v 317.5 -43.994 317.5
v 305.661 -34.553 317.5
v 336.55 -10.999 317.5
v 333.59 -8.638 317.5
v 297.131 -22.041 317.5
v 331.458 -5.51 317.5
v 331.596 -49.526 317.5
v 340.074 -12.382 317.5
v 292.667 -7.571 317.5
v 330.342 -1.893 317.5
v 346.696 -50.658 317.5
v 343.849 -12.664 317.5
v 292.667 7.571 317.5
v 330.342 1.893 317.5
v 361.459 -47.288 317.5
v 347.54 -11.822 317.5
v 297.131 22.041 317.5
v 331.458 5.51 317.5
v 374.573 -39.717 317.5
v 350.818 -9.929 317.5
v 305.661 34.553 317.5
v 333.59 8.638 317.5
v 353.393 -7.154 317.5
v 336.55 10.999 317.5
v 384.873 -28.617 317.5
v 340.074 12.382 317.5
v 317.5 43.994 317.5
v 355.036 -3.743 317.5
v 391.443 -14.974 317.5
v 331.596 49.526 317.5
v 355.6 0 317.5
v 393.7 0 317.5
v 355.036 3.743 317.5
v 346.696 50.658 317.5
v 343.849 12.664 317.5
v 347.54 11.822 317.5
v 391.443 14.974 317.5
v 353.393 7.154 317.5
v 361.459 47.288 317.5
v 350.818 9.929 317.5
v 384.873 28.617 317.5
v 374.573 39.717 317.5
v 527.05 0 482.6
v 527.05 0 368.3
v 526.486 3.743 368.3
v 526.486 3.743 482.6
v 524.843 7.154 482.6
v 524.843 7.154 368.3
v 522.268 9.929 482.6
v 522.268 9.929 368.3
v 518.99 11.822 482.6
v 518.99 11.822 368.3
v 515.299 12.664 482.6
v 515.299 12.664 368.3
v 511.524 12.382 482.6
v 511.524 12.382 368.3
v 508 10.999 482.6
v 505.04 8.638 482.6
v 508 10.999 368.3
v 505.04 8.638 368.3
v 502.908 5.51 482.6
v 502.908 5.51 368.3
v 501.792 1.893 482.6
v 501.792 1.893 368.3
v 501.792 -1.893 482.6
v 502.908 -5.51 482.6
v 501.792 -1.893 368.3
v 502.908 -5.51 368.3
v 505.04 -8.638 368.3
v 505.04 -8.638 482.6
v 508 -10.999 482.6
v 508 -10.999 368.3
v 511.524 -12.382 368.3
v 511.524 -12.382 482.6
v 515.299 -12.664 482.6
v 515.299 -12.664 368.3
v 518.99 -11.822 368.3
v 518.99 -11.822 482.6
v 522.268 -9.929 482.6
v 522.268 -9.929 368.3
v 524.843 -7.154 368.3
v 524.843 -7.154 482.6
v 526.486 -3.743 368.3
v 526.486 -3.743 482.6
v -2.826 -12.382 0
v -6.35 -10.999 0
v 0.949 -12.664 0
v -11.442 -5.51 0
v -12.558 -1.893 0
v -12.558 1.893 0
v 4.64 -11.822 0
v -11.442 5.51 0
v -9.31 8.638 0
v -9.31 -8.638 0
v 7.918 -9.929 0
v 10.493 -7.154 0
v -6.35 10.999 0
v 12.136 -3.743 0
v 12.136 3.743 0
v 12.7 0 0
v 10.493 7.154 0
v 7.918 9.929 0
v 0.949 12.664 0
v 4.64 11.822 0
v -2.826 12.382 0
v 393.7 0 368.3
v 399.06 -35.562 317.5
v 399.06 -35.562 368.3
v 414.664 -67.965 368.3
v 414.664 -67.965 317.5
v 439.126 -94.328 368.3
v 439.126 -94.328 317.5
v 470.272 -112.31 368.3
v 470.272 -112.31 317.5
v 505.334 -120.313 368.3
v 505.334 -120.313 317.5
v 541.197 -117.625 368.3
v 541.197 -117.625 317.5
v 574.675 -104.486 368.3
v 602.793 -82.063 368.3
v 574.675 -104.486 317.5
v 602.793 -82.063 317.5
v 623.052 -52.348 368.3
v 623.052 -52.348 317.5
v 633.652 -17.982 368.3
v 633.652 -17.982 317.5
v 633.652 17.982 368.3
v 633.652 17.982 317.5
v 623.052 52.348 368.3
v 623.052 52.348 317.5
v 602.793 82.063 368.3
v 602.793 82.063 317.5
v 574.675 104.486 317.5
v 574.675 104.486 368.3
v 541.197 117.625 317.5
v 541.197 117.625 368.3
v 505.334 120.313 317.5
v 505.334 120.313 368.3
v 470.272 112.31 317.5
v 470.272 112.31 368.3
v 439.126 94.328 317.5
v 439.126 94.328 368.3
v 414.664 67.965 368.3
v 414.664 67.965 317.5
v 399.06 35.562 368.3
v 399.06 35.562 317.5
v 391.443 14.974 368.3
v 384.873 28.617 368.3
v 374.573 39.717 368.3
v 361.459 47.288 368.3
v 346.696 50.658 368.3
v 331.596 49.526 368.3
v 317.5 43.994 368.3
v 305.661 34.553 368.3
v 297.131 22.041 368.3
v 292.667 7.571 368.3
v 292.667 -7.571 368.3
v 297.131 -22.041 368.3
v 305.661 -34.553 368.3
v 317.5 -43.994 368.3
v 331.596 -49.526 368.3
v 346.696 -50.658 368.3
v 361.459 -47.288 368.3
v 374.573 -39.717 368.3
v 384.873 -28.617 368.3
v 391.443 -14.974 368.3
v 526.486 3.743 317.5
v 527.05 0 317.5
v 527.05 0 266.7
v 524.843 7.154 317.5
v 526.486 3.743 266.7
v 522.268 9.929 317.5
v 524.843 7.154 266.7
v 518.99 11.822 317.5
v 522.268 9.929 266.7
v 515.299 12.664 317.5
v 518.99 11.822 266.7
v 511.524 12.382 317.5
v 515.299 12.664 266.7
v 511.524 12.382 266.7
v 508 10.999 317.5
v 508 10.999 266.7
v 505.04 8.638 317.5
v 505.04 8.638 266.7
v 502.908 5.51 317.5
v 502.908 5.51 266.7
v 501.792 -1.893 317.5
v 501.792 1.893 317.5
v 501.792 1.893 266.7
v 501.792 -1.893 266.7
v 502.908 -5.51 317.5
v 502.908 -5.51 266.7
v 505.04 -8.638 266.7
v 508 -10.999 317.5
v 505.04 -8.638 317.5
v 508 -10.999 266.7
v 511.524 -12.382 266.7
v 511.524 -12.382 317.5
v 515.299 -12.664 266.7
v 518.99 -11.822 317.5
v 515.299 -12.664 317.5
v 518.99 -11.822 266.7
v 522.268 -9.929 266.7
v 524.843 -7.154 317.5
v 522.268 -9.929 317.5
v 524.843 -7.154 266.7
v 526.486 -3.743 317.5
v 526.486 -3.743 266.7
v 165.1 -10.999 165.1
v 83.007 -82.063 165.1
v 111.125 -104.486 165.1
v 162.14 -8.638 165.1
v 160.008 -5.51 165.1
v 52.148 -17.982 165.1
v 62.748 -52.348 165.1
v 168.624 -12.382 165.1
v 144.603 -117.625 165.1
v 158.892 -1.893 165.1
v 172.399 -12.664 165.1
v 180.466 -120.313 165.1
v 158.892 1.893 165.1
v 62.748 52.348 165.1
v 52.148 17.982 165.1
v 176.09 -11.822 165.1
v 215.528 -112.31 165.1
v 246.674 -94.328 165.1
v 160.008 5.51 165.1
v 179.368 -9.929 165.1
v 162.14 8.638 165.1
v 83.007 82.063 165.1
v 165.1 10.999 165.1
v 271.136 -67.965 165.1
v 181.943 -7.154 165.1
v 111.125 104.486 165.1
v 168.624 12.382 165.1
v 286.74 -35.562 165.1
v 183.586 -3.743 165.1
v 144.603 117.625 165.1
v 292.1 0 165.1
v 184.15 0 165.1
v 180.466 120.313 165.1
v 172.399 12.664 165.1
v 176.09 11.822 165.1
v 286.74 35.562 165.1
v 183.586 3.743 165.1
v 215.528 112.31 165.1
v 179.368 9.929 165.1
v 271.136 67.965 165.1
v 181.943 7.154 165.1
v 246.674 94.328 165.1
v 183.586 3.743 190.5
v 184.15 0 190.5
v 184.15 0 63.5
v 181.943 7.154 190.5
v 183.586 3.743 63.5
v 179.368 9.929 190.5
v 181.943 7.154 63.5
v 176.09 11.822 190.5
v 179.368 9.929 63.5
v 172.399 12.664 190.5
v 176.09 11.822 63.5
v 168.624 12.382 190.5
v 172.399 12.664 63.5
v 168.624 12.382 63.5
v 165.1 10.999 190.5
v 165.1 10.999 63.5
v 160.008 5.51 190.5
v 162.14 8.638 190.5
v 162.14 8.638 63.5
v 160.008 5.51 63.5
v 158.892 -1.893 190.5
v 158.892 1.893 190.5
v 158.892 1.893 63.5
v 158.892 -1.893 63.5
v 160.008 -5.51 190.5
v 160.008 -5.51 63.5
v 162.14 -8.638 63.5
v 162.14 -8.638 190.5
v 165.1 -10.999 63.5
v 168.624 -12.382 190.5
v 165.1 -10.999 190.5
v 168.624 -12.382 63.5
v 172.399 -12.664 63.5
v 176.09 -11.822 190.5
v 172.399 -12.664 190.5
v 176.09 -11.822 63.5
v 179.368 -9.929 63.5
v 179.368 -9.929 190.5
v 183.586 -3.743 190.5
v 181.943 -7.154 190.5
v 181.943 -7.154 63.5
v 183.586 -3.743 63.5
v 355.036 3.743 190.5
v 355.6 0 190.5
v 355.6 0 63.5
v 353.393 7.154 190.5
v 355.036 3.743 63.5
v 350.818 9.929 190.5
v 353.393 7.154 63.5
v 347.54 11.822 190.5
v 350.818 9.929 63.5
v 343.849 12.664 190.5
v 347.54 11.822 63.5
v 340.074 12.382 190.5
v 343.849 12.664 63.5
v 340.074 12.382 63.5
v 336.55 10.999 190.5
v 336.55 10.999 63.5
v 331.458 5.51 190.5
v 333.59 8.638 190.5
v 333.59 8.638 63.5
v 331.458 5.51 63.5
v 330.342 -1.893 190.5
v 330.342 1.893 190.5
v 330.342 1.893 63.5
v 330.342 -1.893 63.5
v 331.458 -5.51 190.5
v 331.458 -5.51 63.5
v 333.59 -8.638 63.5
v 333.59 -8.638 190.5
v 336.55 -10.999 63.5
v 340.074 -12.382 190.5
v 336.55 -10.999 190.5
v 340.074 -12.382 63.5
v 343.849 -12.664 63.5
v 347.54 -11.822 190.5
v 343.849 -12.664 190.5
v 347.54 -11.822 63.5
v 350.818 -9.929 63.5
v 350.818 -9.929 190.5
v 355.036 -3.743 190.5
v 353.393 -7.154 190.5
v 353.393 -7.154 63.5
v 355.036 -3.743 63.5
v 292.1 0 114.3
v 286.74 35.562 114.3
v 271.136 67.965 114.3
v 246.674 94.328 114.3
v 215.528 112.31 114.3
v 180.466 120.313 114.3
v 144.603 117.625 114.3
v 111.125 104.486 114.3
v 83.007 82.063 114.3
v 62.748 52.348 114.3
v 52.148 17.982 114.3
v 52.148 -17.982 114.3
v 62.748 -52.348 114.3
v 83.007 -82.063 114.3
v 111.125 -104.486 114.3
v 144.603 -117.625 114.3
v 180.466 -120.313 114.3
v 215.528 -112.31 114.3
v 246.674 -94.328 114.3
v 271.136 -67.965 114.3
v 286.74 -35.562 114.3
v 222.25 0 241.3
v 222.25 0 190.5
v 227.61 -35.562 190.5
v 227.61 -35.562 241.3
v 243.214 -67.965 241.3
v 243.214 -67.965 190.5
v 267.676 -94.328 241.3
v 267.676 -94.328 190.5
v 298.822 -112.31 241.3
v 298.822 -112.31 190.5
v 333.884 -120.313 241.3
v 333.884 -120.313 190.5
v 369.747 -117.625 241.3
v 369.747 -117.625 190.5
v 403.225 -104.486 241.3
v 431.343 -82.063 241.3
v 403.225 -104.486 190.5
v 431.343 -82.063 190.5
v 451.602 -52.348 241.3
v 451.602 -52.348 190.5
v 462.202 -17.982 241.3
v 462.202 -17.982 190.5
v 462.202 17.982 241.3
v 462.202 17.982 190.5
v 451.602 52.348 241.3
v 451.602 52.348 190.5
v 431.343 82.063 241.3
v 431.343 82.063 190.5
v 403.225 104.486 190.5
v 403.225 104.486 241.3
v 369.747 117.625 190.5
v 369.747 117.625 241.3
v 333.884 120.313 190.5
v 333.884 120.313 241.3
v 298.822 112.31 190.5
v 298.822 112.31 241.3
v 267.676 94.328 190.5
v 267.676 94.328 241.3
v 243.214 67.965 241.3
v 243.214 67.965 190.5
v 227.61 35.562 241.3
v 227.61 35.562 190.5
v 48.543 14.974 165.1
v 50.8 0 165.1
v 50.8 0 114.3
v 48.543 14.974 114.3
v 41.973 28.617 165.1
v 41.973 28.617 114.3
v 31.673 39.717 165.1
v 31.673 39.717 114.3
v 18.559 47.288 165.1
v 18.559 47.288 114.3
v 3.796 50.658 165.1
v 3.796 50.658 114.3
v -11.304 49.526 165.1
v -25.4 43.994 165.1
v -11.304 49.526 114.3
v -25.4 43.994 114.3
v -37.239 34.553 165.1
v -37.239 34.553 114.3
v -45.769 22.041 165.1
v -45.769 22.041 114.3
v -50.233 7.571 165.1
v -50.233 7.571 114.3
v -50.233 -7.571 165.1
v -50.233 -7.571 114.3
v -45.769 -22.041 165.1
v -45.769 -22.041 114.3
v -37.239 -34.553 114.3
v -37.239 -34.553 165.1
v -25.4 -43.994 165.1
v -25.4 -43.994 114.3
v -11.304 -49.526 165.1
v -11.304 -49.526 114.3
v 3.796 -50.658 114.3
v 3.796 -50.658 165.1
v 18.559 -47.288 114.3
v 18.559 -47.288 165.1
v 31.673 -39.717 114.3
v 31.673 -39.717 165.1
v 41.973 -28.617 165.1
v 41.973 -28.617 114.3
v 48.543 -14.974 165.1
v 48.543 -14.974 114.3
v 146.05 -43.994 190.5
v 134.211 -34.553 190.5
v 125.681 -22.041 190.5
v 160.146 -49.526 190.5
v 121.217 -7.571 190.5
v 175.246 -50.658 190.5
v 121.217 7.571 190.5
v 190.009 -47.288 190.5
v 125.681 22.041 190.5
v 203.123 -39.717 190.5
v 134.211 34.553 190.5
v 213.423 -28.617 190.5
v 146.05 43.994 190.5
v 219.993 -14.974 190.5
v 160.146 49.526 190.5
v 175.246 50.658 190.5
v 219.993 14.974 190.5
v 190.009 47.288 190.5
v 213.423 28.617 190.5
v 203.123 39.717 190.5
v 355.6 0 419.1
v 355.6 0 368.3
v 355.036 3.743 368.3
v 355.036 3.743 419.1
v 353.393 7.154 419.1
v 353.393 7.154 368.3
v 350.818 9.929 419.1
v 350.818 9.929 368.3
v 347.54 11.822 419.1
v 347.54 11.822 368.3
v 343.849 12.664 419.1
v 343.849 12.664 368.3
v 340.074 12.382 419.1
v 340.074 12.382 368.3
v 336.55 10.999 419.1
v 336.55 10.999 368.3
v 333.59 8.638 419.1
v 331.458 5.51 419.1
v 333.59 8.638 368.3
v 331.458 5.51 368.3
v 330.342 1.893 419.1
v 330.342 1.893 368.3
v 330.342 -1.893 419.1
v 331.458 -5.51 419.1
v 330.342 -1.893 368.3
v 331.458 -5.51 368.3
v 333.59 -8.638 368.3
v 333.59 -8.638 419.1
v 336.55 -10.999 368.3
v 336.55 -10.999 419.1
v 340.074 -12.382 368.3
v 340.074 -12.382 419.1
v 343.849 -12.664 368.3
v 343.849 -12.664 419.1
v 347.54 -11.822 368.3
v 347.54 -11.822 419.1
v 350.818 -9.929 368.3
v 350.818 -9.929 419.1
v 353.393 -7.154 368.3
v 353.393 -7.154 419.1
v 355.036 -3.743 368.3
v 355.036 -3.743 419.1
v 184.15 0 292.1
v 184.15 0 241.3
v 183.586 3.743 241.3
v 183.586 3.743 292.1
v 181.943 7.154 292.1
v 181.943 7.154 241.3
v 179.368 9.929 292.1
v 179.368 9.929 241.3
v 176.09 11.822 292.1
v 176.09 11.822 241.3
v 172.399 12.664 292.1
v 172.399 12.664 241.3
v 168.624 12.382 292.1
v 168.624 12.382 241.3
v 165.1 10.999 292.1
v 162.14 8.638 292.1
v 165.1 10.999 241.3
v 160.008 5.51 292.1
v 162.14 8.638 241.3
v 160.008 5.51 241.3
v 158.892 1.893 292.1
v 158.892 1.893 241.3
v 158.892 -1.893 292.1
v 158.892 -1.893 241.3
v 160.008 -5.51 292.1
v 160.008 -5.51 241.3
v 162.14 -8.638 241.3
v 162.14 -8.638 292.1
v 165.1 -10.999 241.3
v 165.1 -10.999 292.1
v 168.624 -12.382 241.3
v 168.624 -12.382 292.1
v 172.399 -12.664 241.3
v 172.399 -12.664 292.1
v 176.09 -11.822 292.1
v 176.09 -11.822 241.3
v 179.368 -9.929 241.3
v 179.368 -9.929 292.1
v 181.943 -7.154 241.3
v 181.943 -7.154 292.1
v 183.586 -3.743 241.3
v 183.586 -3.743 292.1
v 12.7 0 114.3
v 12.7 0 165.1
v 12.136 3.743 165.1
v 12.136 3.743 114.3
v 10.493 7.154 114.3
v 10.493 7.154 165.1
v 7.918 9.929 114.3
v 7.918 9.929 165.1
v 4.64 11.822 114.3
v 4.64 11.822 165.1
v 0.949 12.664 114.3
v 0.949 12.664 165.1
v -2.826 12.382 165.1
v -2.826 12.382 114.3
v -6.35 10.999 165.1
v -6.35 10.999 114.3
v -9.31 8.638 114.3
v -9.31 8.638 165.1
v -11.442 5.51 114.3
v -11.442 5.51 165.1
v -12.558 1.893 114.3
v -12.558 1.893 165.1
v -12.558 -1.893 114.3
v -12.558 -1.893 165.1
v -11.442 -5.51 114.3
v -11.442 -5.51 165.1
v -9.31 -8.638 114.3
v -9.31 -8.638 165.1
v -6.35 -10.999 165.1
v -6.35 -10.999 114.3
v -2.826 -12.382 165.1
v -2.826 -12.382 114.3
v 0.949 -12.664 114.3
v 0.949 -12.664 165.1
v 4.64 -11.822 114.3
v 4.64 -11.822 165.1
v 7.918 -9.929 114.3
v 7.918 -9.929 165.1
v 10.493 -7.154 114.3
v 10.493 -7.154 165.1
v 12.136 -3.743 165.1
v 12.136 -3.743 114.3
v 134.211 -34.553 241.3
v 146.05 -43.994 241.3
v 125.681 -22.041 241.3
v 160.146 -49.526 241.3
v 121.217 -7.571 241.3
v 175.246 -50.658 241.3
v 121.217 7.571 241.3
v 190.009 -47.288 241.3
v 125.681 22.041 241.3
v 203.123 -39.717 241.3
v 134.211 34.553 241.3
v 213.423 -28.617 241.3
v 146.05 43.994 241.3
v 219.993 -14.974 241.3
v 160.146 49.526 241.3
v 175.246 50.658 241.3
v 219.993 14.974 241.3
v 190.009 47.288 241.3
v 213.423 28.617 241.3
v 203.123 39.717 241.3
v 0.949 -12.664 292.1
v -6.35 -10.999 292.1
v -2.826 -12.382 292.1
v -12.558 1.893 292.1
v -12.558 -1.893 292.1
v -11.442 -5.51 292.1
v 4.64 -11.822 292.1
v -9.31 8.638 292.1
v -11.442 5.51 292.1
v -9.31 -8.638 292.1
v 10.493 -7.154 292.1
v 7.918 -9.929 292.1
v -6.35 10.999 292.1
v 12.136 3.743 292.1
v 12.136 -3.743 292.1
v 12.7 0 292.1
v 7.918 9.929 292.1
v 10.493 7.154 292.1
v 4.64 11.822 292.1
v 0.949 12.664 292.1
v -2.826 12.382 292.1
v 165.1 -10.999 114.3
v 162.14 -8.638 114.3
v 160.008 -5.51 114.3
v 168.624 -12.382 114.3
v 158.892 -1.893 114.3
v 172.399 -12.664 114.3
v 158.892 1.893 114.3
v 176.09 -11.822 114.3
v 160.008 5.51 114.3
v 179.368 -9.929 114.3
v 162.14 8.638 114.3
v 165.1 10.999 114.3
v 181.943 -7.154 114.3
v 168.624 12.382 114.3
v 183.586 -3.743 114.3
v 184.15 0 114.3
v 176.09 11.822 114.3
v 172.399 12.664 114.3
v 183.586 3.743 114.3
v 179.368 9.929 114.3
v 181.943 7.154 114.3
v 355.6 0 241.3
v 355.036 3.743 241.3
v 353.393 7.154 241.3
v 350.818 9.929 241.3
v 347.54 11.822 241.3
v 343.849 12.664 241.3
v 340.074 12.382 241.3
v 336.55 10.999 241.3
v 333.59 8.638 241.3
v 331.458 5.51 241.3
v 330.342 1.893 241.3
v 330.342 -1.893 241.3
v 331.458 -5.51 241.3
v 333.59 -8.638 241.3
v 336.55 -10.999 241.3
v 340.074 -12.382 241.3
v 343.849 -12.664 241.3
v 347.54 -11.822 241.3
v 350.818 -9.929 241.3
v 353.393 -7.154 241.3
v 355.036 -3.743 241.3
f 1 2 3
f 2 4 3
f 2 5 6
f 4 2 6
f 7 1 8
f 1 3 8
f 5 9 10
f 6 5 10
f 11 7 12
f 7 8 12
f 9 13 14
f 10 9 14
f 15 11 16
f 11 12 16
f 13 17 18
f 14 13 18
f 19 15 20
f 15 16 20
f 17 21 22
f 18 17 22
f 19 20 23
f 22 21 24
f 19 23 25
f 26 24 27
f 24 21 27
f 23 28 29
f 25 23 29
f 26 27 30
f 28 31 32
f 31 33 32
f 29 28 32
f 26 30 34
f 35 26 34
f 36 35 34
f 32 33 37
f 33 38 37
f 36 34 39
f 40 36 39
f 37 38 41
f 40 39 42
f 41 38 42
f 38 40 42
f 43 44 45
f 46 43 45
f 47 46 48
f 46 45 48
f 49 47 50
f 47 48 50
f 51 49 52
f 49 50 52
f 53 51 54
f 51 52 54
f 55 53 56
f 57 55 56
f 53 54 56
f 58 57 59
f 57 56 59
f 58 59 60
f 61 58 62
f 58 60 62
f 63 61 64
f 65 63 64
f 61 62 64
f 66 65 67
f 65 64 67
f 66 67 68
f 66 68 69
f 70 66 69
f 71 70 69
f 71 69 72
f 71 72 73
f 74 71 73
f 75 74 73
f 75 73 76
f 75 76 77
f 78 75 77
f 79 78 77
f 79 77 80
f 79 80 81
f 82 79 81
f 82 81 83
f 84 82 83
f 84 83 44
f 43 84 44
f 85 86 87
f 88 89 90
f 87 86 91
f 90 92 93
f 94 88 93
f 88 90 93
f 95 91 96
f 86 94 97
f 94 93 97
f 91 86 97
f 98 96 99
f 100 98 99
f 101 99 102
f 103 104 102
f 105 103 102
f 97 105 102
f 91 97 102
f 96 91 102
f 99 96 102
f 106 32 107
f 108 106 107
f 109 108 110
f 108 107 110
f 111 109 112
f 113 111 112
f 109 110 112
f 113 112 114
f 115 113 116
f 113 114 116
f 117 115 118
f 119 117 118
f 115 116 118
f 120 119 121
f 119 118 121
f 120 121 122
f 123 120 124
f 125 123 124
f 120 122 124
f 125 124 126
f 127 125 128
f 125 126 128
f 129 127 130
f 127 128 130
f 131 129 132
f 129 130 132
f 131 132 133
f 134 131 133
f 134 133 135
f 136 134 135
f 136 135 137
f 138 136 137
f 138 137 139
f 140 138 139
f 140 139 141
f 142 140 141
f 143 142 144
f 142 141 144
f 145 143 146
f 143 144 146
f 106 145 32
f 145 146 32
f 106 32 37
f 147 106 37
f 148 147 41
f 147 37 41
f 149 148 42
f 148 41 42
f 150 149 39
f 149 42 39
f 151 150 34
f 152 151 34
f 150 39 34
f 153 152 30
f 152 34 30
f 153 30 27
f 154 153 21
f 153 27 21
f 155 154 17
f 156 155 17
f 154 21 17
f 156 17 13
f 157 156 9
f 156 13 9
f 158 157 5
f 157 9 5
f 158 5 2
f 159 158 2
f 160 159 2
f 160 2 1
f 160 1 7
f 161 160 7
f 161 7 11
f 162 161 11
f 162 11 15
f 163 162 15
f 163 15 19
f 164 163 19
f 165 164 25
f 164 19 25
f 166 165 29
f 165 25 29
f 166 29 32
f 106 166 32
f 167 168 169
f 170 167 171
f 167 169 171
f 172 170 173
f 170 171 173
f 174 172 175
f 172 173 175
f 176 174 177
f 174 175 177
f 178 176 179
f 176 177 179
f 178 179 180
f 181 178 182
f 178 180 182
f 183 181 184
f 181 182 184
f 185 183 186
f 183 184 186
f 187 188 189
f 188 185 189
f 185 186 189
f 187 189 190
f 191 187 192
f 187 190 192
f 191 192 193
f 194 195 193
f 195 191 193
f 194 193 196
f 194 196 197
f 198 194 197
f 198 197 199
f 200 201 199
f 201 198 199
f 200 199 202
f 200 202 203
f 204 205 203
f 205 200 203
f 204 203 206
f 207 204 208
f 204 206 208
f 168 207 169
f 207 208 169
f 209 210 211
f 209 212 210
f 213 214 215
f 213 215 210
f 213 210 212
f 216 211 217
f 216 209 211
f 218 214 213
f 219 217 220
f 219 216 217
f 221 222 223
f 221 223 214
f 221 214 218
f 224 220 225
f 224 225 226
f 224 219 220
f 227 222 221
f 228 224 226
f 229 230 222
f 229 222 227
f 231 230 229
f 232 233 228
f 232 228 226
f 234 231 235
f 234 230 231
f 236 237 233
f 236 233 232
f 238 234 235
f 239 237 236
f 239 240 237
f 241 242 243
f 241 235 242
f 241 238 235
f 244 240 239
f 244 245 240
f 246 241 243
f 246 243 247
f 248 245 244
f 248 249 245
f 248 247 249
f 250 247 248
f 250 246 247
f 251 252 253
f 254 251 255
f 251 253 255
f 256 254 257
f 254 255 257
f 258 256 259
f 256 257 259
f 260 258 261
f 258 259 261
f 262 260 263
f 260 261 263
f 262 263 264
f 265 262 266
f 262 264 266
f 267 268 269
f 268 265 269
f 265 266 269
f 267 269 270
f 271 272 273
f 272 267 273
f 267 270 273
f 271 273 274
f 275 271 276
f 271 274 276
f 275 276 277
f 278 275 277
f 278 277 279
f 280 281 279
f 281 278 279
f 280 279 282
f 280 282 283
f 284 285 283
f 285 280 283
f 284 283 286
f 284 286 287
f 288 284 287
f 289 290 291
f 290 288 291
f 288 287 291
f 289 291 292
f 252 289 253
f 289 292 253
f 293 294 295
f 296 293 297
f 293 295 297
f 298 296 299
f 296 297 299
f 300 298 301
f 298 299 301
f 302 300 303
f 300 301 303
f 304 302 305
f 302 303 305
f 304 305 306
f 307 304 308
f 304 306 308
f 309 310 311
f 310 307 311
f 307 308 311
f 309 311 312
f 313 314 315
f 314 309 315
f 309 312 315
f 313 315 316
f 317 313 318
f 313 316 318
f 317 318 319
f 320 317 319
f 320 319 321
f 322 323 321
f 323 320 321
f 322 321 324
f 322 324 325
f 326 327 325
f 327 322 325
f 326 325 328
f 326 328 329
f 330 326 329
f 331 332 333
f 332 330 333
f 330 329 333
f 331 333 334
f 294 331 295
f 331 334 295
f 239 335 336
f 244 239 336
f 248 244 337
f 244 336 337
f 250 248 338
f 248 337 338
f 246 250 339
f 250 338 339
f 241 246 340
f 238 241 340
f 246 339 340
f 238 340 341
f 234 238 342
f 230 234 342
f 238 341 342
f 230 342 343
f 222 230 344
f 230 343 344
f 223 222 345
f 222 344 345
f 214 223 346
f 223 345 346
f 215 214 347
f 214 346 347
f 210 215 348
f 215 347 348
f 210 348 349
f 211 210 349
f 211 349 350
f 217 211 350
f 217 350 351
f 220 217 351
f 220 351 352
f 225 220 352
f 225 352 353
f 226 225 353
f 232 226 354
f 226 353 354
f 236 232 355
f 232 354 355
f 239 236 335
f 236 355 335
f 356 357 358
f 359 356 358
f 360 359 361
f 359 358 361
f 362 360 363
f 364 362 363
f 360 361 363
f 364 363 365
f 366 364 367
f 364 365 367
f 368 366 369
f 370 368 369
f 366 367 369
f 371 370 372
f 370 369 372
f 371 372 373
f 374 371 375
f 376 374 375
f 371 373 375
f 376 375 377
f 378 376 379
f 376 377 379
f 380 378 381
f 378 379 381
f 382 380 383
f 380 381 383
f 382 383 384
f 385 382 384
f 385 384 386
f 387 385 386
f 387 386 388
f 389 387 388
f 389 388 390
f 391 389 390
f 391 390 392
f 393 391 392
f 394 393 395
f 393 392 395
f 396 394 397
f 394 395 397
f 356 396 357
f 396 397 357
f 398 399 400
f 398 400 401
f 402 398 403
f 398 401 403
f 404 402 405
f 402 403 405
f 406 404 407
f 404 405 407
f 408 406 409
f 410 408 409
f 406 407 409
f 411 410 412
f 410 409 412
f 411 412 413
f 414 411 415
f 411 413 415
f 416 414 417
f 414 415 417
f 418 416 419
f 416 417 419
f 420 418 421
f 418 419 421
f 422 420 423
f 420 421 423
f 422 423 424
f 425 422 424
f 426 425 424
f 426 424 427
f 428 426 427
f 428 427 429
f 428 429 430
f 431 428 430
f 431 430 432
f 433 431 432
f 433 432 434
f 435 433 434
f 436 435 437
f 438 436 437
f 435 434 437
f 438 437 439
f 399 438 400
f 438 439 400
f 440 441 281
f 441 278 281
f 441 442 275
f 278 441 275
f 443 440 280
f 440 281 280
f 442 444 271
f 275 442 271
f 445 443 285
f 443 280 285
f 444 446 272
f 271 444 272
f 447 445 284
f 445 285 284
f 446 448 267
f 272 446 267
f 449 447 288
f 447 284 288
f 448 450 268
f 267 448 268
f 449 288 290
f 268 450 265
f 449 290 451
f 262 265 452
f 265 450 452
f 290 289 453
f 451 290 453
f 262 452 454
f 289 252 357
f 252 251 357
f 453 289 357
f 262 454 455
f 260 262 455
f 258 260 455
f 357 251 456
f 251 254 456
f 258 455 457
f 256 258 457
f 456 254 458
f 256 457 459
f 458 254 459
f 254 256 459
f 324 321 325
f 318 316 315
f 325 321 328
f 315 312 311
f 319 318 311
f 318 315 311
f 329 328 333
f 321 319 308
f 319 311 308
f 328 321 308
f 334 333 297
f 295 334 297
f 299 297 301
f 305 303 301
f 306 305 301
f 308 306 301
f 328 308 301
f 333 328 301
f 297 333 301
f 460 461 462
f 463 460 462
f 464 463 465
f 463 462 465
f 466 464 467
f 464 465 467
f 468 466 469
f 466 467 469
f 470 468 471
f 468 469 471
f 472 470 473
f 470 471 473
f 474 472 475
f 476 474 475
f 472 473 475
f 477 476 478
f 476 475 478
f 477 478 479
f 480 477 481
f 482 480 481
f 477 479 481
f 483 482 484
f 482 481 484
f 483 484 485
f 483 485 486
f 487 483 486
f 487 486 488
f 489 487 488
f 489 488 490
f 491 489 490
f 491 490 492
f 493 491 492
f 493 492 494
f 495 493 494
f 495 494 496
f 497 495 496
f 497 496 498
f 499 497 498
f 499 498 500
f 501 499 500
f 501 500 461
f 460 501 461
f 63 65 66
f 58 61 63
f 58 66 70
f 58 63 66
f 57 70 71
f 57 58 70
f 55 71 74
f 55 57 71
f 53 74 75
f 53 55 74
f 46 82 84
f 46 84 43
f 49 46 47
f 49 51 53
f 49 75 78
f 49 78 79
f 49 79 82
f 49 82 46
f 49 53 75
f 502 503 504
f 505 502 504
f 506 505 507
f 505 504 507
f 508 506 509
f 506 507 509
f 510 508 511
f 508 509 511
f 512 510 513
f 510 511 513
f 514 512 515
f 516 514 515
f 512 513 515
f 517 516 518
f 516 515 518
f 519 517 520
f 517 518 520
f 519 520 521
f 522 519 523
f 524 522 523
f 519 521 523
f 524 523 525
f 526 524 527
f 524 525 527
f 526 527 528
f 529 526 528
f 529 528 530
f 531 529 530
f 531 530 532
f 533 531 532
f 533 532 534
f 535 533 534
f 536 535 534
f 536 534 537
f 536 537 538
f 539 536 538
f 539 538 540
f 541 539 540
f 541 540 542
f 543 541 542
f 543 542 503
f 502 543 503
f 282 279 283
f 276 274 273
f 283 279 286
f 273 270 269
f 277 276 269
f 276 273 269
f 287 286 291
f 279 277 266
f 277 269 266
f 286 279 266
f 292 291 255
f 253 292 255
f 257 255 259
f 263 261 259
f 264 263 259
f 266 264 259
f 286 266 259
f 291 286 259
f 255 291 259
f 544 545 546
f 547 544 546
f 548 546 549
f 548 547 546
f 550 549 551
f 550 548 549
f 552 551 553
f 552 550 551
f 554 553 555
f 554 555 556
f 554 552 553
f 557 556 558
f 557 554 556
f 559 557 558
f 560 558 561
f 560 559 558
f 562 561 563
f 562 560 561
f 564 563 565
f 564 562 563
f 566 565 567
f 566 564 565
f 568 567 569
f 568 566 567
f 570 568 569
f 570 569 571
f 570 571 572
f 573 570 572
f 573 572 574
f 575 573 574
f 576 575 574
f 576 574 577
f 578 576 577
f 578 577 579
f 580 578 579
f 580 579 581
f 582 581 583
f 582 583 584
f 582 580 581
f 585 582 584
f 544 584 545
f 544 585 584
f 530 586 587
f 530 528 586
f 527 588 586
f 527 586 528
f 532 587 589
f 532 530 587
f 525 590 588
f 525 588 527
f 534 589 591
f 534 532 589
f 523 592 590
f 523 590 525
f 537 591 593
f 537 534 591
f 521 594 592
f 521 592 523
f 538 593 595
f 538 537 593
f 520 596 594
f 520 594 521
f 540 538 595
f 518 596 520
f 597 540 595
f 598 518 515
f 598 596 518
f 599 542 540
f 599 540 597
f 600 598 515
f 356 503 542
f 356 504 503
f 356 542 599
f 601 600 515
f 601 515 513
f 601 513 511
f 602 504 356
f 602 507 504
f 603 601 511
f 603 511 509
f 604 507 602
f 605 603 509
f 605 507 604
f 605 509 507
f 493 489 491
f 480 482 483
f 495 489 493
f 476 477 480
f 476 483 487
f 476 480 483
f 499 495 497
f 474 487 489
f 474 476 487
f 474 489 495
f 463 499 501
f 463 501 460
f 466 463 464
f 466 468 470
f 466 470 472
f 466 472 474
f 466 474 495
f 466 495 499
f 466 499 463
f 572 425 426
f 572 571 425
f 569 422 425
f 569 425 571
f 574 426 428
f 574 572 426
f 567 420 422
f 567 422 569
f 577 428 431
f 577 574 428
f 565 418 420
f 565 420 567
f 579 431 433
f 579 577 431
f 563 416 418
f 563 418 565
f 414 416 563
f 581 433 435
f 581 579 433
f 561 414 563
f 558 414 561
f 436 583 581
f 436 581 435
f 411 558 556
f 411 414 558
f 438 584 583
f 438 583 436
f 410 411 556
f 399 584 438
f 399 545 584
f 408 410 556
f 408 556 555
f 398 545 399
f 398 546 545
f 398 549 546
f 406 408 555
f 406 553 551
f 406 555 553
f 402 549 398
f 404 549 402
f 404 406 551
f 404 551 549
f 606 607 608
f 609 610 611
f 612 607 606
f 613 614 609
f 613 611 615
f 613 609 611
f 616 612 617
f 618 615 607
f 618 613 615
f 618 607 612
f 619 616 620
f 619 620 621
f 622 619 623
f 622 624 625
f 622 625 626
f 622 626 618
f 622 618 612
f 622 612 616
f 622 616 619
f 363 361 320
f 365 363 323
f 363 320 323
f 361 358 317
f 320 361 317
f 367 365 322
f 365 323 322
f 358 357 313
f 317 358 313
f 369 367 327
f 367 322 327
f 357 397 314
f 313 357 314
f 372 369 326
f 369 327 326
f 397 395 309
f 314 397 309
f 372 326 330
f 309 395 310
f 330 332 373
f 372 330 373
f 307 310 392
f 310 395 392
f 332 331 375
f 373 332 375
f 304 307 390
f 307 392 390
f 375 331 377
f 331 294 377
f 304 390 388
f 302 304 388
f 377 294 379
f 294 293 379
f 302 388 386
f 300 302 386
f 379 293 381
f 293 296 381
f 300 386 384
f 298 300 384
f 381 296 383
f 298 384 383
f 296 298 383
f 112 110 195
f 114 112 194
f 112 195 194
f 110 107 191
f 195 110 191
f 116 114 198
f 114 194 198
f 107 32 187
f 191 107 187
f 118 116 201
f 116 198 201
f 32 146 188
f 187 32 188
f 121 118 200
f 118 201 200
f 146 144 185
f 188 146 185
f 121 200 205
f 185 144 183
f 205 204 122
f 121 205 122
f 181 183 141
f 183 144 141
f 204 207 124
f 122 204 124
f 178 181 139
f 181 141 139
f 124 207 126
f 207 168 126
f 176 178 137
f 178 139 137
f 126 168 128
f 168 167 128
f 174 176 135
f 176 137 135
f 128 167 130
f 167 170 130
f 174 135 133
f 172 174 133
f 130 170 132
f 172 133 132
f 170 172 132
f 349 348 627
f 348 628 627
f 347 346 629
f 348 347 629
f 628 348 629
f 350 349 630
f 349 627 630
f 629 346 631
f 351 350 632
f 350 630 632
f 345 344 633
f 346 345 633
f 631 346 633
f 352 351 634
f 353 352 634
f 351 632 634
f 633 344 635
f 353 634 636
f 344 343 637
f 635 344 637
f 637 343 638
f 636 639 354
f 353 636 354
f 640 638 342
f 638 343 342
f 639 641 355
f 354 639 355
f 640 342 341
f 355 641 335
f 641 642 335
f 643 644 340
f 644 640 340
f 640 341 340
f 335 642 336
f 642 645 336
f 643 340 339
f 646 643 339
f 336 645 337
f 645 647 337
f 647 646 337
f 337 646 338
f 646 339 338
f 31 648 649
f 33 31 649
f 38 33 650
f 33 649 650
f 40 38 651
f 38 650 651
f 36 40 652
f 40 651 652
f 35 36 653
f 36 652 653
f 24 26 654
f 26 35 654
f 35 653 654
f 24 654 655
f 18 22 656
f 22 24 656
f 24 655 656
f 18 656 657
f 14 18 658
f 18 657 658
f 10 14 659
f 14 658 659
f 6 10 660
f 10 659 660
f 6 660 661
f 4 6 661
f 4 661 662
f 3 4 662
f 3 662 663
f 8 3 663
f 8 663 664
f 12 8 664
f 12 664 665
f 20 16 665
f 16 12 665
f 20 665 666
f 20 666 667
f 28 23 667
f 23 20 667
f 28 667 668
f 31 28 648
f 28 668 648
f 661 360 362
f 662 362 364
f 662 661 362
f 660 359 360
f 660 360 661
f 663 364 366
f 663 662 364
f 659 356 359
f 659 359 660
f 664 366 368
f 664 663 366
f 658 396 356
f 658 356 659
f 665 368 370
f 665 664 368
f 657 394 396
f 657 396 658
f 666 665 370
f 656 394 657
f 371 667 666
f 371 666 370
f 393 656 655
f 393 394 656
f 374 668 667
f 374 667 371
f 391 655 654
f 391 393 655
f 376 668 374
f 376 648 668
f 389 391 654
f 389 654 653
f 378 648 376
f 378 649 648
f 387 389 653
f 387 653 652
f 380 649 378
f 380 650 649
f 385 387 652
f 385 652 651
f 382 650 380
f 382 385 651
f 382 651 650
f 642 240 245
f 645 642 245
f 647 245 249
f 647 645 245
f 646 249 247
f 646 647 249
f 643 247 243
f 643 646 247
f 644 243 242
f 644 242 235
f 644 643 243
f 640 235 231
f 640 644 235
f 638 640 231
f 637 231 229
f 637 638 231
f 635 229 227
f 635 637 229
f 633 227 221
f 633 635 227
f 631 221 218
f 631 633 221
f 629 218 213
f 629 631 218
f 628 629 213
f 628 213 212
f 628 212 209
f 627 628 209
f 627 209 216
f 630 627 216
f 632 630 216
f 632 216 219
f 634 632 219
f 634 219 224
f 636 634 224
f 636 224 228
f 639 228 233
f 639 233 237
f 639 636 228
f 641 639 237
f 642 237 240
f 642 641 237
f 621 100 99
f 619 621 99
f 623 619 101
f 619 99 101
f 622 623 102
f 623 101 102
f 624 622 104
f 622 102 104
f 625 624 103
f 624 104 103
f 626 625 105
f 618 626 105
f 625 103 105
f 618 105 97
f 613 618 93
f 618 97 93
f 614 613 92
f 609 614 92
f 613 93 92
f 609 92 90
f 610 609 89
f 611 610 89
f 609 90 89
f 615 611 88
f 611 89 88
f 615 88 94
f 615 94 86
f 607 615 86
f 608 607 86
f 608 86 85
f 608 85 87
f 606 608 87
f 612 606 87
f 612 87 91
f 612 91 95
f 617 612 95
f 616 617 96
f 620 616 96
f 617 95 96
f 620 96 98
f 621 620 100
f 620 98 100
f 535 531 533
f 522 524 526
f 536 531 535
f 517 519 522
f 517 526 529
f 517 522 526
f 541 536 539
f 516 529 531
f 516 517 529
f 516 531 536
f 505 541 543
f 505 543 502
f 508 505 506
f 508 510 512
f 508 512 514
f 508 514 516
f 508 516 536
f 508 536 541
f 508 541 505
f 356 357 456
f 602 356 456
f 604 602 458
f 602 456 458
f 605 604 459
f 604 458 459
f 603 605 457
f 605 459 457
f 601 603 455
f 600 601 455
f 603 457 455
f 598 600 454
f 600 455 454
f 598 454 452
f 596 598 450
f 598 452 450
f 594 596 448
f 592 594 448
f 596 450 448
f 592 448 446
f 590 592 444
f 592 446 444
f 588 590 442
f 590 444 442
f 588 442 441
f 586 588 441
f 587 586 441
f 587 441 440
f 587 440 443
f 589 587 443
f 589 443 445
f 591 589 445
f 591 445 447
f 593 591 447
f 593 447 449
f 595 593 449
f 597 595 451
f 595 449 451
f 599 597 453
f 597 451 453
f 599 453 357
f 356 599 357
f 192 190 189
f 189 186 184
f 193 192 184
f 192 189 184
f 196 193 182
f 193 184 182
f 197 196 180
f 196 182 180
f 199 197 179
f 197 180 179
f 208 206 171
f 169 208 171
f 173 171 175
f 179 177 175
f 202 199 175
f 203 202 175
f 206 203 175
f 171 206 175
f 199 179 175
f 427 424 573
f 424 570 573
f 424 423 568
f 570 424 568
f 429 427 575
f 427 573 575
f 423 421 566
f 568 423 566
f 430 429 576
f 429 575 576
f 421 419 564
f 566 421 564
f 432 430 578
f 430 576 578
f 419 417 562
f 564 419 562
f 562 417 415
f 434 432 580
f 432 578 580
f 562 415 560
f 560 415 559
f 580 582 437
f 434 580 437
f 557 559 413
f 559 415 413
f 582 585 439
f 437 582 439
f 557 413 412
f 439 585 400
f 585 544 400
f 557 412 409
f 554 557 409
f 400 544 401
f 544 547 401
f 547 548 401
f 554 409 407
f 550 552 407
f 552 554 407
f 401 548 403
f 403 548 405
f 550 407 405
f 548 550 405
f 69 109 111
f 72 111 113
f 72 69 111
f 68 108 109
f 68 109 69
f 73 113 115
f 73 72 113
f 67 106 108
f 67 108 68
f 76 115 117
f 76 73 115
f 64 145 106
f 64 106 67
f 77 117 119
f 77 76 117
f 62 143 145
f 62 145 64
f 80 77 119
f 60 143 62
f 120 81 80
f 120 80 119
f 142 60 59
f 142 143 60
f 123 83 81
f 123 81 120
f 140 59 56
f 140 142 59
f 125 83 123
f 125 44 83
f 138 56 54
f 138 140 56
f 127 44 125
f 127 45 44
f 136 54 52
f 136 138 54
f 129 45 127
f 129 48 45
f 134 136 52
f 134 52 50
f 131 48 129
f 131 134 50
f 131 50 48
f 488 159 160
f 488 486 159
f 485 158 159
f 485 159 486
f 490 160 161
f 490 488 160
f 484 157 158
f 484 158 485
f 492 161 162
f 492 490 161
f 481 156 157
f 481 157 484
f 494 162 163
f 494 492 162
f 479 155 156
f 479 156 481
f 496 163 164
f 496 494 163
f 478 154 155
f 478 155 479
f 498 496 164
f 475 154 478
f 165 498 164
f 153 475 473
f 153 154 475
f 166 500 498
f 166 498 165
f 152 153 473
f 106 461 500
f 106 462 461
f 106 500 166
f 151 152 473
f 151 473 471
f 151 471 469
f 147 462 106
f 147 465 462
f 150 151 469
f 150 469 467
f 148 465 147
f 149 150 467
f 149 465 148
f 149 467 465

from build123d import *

# Parameters (mm, degrees)
SKETCH1_R             = 12.7
BOSS_EXTRUDE1_DEPTH   = 292.1
BOSS_EXTRUDE2_START   = 63.5
SKETCH1_3_R           = 12.7
BOSS_EXTRUDE2_DEPTH   = 228.6
BOSS_EXTRUDE3_START   = 63.5
SKETCH1_4_R           = 12.7
BOSS_EXTRUDE3_DEPTH   = 355.6
BOSS_EXTRUDE4_START   = 266.7
SKETCH1_5_R           = 12.7
BOSS_EXTRUDE4_DEPTH   = 215.9
BOSS_EXTRUDE5_START   = 114.3
SKETCH1_6_R           = 50.8
SKETCH1_6_R_2         = 12.7
BOSS_EXTRUDE5_DEPTH   = 50.8
SKETCH1_6_R_3         = 120.65
BOSS_EXTRUDE5_2_DEPTH = 50.8
BOSS_EXTRUDE7_START   = 190.5
SKETCH1_9_R           = 50.8
SKETCH1_9_R_2         = 120.65
BOSS_EXTRUDE7_DEPTH   = 50.8
BOSS_EXTRUDE8_START   = 317.5
SKETCH1_10_R          = 50.8
SKETCH1_10_R_2        = 120.65
BOSS_EXTRUDE8_DEPTH   = 50.8


with BuildPart() as part:
    # Sketch1 → Boss-Extrude1 (new body)
    with BuildSketch(Plane.XY):
        Circle(SKETCH1_R)
    extrude(amount=BOSS_EXTRUDE1_DEPTH)


with BuildPart() as body_2:
    # Sketch1<3> → Boss-Extrude2 (new body)
    with BuildSketch(Plane.XY.offset(BOSS_EXTRUDE2_START)):
        with Locations((171.45, 0)):
            Circle(SKETCH1_3_R)
    extrude(amount=BOSS_EXTRUDE2_DEPTH)



with BuildPart() as body_3:
    # Sketch1<4> → Boss-Extrude3 (new body)
    with BuildSketch(Plane.XY.offset(BOSS_EXTRUDE3_START)):
        with Locations((342.9, 0)):
            Circle(SKETCH1_4_R)
    extrude(amount=BOSS_EXTRUDE3_DEPTH)


with BuildPart() as body_4:
    # Sketch1<5> → Boss-Extrude4 (new body)
    with BuildSketch(Plane.XY.offset(BOSS_EXTRUDE4_START)):
        with Locations((514.35, 0)):
            Circle(SKETCH1_5_R)
    extrude(amount=BOSS_EXTRUDE4_DEPTH)


with BuildPart() as body_5:
    # Sketch1<6> → Boss-Extrude5 (new body)
    with BuildSketch(Plane.XY.offset(BOSS_EXTRUDE5_START)):
        Circle(SKETCH1_6_R)
        Circle(SKETCH1_6_R_2, mode=Mode.SUBTRACT)
    extrude(amount=BOSS_EXTRUDE5_DEPTH)


with BuildPart() as body_6:
    # Sketch1<6> → Boss-Extrude5 2 (new body)
    with BuildSketch(Plane.XY.offset(BOSS_EXTRUDE5_START)):
        with Locations((171.45, 0)):
            Circle(SKETCH1_6_R_3)
        with Locations((171.45, 0)):
            Circle(SKETCH1_6_R_2, mode=Mode.SUBTRACT)
    extrude(amount=BOSS_EXTRUDE5_2_DEPTH)


with BuildPart() as body_2_1:
    add(body_2.part)

    add(body_3.part)  # Boss-Extrude7 merges body 3
    # Sketch1<9> → Boss-Extrude7 (add)
    with BuildSketch(Plane.XY.offset(BOSS_EXTRUDE7_START)):
        with Locations((171.45, 0)):
            Circle(SKETCH1_9_R)
        with Locations((342.9, 0)):
            Circle(SKETCH1_9_R_2)
    extrude(amount=BOSS_EXTRUDE7_DEPTH)


    add(body_4.part)  # Boss-Extrude8 merges body 4
    # Sketch1<10> → Boss-Extrude8 (add)
    with BuildSketch(Plane.XY.offset(BOSS_EXTRUDE8_START)):
        with Locations((342.9, 0)):
            Circle(SKETCH1_10_R)
        with Locations((514.35, 0)):
            Circle(SKETCH1_10_R_2)
    extrude(amount=BOSS_EXTRUDE8_DEPTH)


solid = Compound([part.part, body_5.part, body_6.part, body_2_1.part])
